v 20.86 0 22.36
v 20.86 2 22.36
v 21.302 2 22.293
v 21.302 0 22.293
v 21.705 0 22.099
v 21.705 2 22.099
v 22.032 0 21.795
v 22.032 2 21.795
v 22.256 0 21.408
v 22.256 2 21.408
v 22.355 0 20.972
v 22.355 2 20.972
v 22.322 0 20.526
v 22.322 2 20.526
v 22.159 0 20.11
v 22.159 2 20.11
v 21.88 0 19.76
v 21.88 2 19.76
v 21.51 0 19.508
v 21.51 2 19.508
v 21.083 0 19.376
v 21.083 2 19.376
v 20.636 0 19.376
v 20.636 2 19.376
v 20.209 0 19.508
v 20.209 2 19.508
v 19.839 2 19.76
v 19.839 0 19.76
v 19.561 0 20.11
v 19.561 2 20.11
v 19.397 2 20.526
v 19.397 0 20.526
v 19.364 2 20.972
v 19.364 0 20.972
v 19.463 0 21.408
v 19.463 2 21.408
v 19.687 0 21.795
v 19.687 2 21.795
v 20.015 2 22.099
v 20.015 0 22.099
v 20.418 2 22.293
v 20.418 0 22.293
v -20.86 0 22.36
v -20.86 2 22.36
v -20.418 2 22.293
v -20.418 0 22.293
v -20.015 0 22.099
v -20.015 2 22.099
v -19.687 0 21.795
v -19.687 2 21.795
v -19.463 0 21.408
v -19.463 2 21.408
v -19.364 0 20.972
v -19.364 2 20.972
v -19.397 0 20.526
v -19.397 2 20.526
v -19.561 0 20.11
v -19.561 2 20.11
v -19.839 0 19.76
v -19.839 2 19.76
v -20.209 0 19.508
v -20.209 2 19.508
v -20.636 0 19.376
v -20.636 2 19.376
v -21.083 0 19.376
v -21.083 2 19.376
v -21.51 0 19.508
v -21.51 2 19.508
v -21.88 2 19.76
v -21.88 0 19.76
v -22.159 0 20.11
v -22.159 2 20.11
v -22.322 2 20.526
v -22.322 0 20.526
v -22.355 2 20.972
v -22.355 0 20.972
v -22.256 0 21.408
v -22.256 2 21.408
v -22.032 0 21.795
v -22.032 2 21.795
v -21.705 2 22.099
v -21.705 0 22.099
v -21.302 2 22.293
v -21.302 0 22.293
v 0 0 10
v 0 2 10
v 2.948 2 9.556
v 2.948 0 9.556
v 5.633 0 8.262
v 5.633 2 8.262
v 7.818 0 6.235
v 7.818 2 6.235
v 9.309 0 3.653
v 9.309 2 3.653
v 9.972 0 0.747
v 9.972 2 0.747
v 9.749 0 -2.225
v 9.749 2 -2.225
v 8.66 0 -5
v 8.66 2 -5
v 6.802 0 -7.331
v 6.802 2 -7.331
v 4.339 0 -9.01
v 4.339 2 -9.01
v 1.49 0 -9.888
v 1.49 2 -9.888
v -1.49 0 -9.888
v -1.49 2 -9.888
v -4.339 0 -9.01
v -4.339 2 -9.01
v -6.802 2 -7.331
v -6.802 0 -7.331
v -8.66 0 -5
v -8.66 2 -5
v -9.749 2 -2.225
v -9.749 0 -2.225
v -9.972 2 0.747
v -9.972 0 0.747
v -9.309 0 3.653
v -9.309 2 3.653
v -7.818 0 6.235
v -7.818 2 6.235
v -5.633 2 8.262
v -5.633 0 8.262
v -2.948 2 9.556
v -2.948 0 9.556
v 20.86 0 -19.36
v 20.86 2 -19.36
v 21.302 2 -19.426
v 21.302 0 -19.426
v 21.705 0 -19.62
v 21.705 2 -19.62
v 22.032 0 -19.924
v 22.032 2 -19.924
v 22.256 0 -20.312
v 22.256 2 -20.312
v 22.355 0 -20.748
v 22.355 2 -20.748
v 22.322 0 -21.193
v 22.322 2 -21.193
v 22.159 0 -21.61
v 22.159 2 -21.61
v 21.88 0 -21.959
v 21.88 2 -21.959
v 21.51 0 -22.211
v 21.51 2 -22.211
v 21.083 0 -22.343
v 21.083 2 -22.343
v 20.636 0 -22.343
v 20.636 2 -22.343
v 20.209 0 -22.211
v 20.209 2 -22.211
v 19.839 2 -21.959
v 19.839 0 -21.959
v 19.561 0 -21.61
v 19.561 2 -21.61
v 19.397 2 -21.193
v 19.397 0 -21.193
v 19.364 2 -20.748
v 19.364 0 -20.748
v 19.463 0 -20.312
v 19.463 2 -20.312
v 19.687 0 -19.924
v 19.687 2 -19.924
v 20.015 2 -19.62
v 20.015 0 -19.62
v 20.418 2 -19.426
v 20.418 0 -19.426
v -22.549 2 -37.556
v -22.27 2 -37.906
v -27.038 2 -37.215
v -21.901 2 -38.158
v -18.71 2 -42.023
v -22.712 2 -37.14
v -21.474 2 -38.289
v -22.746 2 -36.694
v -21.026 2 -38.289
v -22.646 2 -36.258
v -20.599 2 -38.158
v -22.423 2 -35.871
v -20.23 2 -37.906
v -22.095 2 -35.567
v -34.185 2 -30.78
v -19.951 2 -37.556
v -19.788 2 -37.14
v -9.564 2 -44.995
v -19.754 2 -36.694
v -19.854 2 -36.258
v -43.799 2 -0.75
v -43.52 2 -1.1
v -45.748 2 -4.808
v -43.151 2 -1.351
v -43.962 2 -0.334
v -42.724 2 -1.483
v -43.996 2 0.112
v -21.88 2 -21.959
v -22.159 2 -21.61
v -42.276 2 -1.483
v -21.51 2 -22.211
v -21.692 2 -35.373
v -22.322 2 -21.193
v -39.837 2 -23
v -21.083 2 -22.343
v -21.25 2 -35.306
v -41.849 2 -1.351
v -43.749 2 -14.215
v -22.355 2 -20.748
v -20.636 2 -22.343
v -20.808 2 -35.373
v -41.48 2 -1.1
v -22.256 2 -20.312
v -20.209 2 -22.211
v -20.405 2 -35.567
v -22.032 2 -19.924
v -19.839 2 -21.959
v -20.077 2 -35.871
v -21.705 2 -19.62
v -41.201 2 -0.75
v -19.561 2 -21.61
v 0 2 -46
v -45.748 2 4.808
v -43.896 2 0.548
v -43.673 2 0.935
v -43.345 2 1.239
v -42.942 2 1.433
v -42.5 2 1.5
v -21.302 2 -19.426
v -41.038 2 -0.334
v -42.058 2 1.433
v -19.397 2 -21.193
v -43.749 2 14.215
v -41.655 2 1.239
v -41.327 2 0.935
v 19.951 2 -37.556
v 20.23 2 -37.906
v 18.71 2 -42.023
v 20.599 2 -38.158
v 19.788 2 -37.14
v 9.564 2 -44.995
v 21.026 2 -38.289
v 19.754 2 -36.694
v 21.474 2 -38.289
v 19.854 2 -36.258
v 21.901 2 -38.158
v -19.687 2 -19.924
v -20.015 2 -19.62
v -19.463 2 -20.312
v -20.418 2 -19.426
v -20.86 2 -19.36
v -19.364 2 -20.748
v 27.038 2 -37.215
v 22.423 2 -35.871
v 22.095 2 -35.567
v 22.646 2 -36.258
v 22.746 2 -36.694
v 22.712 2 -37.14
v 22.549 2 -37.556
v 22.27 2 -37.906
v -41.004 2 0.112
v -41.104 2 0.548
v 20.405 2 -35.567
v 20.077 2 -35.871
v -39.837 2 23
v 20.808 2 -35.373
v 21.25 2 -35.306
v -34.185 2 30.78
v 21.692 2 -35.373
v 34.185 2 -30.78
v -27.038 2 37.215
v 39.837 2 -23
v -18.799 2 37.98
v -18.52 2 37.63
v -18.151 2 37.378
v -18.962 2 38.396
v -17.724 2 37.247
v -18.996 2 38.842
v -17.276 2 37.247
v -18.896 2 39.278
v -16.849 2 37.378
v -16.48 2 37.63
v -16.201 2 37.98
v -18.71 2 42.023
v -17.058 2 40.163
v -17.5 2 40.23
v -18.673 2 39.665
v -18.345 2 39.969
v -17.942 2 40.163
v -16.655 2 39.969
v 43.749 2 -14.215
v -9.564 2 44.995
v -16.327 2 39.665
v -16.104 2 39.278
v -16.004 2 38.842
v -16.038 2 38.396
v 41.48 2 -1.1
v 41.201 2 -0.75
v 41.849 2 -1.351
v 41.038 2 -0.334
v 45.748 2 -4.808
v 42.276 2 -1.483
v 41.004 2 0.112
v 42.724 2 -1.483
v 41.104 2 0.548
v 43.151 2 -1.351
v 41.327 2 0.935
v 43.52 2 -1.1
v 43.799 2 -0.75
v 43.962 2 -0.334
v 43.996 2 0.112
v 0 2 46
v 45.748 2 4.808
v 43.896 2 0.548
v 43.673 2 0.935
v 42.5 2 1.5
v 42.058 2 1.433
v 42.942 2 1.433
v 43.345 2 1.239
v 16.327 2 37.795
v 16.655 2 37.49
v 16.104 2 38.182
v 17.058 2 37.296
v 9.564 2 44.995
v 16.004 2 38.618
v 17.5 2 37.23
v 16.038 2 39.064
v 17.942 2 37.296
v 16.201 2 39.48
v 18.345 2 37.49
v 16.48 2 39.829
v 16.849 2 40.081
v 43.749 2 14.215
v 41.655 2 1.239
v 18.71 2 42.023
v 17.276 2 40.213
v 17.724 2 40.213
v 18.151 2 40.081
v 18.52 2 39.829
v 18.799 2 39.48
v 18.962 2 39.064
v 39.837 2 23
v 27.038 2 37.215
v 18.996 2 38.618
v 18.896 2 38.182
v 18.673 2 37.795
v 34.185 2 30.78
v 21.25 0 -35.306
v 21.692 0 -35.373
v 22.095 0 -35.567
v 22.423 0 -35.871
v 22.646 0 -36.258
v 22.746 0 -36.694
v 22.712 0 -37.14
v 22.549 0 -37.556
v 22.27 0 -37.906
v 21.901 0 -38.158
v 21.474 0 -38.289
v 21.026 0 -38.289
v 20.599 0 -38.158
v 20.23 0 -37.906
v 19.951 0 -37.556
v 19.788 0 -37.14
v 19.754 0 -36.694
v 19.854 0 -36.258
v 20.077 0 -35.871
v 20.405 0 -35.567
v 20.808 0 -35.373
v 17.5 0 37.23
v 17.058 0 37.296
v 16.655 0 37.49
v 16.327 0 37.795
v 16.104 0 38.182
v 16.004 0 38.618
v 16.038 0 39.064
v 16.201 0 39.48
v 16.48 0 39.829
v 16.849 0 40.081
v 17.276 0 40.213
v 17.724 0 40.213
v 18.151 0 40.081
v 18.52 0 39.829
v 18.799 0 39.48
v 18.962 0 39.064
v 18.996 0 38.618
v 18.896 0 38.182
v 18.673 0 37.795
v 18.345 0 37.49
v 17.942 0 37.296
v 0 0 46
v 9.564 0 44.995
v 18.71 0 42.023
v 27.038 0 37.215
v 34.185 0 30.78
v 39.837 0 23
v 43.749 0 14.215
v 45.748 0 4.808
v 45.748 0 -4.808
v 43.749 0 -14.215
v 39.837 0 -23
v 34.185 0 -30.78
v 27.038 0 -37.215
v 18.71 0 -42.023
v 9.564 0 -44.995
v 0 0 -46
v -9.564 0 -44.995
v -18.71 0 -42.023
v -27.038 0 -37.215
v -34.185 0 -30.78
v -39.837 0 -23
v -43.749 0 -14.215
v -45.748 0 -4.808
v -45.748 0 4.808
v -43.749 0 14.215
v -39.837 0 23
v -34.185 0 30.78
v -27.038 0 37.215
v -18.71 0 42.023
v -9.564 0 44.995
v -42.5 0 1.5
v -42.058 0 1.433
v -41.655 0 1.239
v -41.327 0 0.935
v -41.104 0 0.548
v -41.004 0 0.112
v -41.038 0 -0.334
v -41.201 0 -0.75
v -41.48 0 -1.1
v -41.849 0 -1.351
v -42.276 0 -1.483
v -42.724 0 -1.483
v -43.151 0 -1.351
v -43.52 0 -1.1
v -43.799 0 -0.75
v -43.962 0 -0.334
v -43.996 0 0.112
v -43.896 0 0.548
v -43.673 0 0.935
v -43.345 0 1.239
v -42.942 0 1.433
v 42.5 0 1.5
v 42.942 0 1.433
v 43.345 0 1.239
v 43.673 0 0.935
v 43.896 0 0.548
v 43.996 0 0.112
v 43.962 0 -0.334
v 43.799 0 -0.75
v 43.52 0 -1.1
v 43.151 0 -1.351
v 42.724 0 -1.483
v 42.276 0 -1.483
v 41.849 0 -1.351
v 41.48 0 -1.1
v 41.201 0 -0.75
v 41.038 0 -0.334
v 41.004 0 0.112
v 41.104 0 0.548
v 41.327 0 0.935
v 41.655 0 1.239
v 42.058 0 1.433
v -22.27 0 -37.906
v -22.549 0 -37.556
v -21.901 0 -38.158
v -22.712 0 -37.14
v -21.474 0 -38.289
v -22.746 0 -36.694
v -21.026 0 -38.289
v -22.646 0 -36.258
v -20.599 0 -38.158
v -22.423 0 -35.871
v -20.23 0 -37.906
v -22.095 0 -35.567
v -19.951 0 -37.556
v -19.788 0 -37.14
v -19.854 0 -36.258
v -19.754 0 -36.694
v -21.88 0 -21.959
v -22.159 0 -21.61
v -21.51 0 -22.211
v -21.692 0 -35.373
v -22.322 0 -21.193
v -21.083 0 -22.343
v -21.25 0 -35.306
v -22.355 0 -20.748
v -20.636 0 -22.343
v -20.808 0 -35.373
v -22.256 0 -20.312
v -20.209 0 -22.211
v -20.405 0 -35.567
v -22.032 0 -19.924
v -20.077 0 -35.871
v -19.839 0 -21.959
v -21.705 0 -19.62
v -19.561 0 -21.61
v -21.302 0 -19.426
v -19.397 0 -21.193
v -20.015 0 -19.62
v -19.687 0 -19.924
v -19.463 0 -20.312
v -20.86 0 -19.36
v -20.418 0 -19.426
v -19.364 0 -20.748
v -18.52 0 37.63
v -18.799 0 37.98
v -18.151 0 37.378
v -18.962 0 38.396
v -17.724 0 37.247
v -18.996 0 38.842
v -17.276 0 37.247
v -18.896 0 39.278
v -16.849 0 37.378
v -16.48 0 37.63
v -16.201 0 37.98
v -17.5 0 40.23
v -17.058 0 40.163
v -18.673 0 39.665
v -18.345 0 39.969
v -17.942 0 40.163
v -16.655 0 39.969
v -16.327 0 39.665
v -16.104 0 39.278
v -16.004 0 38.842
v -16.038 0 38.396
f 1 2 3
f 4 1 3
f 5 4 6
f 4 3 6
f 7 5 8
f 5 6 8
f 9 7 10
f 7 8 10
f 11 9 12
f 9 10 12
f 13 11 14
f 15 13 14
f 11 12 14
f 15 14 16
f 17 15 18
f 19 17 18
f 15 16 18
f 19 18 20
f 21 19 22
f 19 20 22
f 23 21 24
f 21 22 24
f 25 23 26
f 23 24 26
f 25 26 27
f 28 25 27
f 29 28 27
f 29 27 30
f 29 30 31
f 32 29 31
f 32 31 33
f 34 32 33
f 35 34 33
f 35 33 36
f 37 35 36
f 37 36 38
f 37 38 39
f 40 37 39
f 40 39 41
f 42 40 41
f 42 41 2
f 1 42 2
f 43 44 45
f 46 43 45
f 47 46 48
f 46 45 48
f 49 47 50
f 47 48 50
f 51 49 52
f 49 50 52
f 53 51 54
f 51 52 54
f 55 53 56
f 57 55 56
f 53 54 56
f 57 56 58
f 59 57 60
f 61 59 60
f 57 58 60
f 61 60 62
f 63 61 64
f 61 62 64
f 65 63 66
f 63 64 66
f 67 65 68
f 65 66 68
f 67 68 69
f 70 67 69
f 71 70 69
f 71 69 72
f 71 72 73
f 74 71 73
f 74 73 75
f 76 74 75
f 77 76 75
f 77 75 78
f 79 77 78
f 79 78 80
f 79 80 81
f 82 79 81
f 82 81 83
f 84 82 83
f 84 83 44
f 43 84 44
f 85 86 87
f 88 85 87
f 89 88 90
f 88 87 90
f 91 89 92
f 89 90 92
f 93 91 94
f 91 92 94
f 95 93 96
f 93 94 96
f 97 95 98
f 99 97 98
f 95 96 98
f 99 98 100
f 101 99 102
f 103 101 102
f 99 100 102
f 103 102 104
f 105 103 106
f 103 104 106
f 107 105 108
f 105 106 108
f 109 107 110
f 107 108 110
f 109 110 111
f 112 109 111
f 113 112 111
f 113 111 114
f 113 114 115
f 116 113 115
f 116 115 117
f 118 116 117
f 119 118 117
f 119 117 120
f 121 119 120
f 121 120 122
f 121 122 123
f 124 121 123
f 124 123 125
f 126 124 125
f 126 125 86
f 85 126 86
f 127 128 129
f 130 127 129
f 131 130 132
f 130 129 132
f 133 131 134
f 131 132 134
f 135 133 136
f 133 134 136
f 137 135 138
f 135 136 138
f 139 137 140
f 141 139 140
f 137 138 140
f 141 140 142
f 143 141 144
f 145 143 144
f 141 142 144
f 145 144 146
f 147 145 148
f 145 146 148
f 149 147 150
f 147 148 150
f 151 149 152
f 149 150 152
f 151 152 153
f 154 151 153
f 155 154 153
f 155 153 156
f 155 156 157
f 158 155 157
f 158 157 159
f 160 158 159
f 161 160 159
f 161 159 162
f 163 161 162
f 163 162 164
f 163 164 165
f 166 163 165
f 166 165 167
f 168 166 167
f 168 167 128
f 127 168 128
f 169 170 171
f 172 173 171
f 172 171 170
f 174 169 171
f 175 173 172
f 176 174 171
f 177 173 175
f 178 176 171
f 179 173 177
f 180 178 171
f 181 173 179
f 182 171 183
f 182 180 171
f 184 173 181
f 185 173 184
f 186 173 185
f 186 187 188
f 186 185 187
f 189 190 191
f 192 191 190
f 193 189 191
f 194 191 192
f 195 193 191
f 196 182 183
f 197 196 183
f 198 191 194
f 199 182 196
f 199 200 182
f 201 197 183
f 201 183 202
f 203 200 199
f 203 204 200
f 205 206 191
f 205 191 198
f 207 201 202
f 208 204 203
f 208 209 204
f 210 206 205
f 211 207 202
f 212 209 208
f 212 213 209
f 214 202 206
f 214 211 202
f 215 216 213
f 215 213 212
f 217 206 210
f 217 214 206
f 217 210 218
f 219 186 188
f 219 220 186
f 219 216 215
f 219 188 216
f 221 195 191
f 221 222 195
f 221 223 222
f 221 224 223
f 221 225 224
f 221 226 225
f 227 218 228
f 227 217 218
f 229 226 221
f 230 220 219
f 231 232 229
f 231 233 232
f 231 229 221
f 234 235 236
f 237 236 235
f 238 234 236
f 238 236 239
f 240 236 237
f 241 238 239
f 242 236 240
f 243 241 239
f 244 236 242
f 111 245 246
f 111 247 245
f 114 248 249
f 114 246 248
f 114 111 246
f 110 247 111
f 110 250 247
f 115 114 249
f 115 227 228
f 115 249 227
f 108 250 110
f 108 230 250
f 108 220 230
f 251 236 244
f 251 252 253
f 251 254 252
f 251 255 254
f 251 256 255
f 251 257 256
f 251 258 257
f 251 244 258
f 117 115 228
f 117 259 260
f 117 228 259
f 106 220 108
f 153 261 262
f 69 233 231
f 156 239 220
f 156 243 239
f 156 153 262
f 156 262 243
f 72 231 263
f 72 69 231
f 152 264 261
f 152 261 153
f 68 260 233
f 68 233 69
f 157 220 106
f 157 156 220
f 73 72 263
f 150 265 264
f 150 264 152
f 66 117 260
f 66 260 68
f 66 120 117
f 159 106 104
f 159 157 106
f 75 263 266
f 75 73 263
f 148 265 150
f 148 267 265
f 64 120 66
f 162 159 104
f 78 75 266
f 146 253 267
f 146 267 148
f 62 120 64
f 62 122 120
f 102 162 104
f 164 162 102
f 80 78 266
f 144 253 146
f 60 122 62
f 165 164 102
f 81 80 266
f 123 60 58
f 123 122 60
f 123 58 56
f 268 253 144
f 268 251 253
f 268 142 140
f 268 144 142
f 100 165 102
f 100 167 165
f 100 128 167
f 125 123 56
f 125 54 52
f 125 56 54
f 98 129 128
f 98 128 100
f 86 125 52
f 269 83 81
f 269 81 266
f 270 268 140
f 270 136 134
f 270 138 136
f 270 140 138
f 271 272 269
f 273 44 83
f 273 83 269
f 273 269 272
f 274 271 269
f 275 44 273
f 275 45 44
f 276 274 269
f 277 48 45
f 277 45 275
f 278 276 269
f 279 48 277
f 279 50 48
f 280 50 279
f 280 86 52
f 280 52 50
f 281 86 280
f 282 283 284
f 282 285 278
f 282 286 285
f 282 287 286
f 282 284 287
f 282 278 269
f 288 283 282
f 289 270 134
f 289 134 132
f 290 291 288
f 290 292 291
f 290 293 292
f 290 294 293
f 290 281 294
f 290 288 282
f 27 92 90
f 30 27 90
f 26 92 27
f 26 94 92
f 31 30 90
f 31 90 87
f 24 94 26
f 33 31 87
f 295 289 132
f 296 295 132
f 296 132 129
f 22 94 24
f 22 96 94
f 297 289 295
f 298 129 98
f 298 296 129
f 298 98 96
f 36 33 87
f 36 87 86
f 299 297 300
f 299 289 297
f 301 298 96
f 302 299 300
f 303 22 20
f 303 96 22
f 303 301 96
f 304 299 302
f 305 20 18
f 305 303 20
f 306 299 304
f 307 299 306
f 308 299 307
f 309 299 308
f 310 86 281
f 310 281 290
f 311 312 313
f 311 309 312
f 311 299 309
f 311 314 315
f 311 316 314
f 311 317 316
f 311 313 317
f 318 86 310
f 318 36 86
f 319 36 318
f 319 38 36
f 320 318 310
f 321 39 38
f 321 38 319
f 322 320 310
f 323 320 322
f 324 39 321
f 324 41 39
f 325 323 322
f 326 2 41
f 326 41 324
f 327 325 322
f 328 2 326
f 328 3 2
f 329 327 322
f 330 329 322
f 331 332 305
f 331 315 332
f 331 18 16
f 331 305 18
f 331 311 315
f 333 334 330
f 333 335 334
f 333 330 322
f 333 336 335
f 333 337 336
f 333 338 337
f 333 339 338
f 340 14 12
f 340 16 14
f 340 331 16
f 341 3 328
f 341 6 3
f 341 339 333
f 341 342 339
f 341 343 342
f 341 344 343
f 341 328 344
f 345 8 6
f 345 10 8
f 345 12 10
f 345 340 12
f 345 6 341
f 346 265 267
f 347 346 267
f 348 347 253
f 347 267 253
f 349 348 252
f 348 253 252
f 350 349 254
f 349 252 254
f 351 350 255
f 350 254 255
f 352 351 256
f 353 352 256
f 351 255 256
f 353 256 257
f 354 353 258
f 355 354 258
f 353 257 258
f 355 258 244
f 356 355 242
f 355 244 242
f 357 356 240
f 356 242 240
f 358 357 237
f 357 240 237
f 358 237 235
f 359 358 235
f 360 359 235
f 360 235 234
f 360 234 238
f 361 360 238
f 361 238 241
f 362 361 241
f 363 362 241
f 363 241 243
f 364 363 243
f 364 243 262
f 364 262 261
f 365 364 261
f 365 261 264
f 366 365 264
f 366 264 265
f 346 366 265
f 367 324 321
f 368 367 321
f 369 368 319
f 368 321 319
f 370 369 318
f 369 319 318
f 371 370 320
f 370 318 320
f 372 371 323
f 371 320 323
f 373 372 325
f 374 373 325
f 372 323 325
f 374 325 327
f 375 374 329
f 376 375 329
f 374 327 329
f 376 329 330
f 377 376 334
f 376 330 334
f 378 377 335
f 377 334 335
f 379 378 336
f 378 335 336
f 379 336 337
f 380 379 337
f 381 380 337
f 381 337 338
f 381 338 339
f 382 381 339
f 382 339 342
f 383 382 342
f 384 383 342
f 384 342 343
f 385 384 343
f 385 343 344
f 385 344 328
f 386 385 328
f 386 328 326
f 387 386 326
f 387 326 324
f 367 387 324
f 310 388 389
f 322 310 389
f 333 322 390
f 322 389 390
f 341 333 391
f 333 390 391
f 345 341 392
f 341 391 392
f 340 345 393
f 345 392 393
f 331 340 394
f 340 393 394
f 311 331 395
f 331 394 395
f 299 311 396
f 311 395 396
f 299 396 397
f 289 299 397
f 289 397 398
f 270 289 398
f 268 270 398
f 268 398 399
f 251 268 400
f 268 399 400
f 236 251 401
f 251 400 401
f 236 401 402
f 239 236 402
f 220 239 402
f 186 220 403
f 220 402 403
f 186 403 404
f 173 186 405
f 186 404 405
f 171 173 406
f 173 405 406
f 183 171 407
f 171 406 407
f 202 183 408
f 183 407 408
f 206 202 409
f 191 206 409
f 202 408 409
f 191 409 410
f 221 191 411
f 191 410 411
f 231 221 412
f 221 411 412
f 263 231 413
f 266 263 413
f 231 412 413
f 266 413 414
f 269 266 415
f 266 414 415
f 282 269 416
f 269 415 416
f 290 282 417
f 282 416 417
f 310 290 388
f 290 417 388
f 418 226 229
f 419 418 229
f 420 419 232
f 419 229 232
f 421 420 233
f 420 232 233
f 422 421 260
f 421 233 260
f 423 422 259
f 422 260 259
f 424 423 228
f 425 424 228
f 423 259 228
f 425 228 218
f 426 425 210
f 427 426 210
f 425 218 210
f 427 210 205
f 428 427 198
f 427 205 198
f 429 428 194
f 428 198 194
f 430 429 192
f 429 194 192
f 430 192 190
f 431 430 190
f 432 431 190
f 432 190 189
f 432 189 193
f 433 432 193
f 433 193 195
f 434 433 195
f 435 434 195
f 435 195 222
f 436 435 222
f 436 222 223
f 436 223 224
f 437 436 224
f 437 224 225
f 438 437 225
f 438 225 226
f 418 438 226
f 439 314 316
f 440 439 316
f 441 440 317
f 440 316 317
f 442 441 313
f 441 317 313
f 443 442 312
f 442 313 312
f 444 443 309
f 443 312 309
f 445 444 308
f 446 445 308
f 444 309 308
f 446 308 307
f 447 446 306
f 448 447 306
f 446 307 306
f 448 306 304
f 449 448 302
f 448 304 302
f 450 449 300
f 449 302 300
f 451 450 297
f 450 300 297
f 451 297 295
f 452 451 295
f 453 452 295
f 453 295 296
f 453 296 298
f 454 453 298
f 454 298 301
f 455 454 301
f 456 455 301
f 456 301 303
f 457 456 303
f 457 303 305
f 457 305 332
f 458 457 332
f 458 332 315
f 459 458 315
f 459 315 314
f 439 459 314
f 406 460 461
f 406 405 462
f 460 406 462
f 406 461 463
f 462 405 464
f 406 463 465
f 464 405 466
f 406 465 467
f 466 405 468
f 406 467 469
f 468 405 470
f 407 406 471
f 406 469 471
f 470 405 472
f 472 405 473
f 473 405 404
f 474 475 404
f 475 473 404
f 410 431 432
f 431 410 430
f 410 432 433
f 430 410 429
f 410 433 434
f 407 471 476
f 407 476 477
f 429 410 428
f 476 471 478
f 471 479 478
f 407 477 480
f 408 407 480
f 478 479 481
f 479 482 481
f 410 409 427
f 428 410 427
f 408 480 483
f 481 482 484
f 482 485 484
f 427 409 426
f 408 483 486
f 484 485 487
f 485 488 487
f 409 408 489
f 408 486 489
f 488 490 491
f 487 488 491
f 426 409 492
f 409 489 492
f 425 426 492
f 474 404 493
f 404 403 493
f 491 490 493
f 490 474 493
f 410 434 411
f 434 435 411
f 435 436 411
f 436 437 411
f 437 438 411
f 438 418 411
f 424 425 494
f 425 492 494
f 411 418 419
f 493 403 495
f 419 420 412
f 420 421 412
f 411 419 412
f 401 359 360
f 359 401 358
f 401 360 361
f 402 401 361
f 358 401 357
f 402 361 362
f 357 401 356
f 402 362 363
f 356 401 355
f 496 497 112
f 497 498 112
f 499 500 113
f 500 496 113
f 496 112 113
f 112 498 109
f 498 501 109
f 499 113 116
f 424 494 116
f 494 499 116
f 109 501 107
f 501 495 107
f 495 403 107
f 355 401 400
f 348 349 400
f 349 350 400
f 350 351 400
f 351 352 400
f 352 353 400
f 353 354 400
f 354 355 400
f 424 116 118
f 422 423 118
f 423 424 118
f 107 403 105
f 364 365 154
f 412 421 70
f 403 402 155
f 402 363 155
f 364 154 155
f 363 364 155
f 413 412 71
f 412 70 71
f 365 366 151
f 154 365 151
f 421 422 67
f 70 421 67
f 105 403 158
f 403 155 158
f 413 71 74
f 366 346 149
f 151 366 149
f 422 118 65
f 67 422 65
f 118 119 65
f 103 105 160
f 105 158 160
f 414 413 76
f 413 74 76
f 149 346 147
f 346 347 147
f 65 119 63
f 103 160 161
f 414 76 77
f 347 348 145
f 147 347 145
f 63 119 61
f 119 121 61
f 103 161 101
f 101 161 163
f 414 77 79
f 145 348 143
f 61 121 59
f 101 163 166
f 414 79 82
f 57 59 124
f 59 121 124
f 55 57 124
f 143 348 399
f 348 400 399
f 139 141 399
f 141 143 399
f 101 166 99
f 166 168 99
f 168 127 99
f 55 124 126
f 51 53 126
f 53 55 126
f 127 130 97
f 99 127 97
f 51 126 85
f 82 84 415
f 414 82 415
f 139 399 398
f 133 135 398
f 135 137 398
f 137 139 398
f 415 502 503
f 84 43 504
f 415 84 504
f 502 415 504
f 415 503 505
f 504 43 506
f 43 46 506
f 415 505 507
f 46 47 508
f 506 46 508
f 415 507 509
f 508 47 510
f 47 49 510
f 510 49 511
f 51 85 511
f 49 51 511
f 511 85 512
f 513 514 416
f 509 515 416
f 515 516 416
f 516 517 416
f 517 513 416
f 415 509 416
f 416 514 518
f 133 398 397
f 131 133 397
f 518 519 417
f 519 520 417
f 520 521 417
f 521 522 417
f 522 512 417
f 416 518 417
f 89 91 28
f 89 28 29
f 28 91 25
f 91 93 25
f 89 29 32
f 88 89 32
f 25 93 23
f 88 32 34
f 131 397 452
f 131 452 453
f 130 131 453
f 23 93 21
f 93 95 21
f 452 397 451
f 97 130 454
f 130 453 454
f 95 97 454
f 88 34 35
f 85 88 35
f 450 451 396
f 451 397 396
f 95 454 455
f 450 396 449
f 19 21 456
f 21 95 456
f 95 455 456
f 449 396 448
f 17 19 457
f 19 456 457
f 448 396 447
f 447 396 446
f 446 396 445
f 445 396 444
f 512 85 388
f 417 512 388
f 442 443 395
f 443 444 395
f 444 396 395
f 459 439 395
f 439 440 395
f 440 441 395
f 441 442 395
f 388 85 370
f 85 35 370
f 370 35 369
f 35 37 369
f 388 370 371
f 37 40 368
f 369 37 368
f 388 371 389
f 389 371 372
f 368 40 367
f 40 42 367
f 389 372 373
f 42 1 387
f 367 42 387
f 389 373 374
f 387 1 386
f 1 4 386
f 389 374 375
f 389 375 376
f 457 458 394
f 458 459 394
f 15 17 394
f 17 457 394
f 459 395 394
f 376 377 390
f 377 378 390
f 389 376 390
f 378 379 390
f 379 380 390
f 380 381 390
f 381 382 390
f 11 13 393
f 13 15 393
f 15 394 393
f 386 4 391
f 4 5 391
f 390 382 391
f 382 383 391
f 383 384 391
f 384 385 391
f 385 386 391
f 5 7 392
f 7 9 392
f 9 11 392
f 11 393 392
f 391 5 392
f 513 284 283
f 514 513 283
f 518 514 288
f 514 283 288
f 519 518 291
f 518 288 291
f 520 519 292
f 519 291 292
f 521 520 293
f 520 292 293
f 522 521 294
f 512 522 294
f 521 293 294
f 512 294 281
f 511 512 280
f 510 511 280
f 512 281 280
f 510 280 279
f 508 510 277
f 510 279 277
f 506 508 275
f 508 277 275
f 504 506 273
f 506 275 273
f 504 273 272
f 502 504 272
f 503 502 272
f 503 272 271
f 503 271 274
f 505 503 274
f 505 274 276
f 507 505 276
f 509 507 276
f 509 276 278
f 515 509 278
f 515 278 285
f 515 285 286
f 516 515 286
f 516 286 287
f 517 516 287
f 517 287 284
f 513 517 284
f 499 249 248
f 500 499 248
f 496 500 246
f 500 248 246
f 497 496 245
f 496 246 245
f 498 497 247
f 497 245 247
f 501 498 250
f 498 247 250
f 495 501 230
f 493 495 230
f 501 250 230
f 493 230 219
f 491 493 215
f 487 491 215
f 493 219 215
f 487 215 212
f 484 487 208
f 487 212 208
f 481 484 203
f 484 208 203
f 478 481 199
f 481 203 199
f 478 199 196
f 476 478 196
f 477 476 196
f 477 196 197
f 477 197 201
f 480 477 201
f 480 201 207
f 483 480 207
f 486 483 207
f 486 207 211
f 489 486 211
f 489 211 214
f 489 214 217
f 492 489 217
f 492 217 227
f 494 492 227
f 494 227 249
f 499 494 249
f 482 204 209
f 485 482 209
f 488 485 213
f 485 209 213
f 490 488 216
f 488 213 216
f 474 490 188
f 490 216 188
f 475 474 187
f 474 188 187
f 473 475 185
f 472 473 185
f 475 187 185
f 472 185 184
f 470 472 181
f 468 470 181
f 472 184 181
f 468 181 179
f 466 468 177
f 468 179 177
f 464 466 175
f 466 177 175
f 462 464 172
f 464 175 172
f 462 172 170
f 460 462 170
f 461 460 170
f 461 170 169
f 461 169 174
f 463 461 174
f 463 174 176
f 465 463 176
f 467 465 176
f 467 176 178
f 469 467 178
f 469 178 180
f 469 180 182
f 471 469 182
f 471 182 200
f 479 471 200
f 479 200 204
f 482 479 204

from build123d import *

# Parameters (mm, degrees)
SKETCH_1_R          = 46
EXTRUDE_1_DEPTH     = 2
SKETCH_2_R          = 1.5
CUT_EXTRUDE_1_DEPTH = 66.084560381
SKETCH_3_R          = 1.5
CUT_EXTRUDE_2_DEPTH = 66.084560381
SKETCH_4_R          = 10
CUT_EXTRUDE_3_DEPTH = 66.084560381


with BuildPart() as part:
    # 草图1 → 凸台-拉伸1 (new body)
    with BuildSketch(Plane(origin=(0, 0, 0), x_dir=(1, 0, 0), z_dir=(0, 1, 0))):
        with Locations(Location((0, 0, 0), (0, 0, 270))):
            Circle(SKETCH_1_R)
    extrude(amount=EXTRUDE_1_DEPTH)

    # 草图2 → 切除-拉伸1 (cut, through all)
    with BuildSketch(Plane(origin=(0, 2, 0), x_dir=(1, 0, 0), z_dir=(0, 1, 0))):
        with Locations(Location((-21.25, 36.806079661, 0), (0, 0, 270))):
            Circle(SKETCH_2_R)
        with Locations(Location((21.25, 36.806079661, 0), (0, 0, 270))):
            Circle(SKETCH_2_R)
        with Locations(Location((42.5, 0, 0), (0, 0, 270))):
            Circle(SKETCH_2_R)
        with Locations(Location((-42.5, 0, 0), (0, 0, 270))):
            Circle(SKETCH_2_R)
        with Locations(Location((-17.5, -38.729833462, 0), (0, 0, 270))):
            Circle(SKETCH_2_R)
        with Locations(Location((17.5, -38.729833462, 0), (0, 0, 90))):
            Circle(SKETCH_2_R)
    extrude(amount=-CUT_EXTRUDE_1_DEPTH, mode=Mode.SUBTRACT)

    # 草图3 → 切除-拉伸2 (cut, through all)
    with BuildSketch(Plane(origin=(0, 2, 0), x_dir=(1, 0, 0), z_dir=(0, 1, 0))):
        with Locations(Location((-20.859650045, -20.859650045, 0), (0, 0, 270))):
            Circle(SKETCH_3_R)
        with Locations(Location((-20.859650045, 20.859650045, 0), (0, 0, 270))):
            Circle(SKETCH_3_R)
        with Locations(Location((20.859650045, 20.859650045, 0), (0, 0, 270))):
            Circle(SKETCH_3_R)
        with Locations(Location((20.859650045, -20.859650045, 0), (0, 0, 270))):
            Circle(SKETCH_3_R)
    extrude(amount=-CUT_EXTRUDE_2_DEPTH, mode=Mode.SUBTRACT)

    # 草图4 → 切除-拉伸3 (cut, through all)
    with BuildSketch(Plane(origin=(0, 2, 0), x_dir=(1, 0, 0), z_dir=(0, 1, 0))):
        with Locations(Location((0, 0, 0), (0, 0, 270))):
            Circle(SKETCH_4_R)
    extrude(amount=-CUT_EXTRUDE_3_DEPTH, mode=Mode.SUBTRACT)


solid = part.part
